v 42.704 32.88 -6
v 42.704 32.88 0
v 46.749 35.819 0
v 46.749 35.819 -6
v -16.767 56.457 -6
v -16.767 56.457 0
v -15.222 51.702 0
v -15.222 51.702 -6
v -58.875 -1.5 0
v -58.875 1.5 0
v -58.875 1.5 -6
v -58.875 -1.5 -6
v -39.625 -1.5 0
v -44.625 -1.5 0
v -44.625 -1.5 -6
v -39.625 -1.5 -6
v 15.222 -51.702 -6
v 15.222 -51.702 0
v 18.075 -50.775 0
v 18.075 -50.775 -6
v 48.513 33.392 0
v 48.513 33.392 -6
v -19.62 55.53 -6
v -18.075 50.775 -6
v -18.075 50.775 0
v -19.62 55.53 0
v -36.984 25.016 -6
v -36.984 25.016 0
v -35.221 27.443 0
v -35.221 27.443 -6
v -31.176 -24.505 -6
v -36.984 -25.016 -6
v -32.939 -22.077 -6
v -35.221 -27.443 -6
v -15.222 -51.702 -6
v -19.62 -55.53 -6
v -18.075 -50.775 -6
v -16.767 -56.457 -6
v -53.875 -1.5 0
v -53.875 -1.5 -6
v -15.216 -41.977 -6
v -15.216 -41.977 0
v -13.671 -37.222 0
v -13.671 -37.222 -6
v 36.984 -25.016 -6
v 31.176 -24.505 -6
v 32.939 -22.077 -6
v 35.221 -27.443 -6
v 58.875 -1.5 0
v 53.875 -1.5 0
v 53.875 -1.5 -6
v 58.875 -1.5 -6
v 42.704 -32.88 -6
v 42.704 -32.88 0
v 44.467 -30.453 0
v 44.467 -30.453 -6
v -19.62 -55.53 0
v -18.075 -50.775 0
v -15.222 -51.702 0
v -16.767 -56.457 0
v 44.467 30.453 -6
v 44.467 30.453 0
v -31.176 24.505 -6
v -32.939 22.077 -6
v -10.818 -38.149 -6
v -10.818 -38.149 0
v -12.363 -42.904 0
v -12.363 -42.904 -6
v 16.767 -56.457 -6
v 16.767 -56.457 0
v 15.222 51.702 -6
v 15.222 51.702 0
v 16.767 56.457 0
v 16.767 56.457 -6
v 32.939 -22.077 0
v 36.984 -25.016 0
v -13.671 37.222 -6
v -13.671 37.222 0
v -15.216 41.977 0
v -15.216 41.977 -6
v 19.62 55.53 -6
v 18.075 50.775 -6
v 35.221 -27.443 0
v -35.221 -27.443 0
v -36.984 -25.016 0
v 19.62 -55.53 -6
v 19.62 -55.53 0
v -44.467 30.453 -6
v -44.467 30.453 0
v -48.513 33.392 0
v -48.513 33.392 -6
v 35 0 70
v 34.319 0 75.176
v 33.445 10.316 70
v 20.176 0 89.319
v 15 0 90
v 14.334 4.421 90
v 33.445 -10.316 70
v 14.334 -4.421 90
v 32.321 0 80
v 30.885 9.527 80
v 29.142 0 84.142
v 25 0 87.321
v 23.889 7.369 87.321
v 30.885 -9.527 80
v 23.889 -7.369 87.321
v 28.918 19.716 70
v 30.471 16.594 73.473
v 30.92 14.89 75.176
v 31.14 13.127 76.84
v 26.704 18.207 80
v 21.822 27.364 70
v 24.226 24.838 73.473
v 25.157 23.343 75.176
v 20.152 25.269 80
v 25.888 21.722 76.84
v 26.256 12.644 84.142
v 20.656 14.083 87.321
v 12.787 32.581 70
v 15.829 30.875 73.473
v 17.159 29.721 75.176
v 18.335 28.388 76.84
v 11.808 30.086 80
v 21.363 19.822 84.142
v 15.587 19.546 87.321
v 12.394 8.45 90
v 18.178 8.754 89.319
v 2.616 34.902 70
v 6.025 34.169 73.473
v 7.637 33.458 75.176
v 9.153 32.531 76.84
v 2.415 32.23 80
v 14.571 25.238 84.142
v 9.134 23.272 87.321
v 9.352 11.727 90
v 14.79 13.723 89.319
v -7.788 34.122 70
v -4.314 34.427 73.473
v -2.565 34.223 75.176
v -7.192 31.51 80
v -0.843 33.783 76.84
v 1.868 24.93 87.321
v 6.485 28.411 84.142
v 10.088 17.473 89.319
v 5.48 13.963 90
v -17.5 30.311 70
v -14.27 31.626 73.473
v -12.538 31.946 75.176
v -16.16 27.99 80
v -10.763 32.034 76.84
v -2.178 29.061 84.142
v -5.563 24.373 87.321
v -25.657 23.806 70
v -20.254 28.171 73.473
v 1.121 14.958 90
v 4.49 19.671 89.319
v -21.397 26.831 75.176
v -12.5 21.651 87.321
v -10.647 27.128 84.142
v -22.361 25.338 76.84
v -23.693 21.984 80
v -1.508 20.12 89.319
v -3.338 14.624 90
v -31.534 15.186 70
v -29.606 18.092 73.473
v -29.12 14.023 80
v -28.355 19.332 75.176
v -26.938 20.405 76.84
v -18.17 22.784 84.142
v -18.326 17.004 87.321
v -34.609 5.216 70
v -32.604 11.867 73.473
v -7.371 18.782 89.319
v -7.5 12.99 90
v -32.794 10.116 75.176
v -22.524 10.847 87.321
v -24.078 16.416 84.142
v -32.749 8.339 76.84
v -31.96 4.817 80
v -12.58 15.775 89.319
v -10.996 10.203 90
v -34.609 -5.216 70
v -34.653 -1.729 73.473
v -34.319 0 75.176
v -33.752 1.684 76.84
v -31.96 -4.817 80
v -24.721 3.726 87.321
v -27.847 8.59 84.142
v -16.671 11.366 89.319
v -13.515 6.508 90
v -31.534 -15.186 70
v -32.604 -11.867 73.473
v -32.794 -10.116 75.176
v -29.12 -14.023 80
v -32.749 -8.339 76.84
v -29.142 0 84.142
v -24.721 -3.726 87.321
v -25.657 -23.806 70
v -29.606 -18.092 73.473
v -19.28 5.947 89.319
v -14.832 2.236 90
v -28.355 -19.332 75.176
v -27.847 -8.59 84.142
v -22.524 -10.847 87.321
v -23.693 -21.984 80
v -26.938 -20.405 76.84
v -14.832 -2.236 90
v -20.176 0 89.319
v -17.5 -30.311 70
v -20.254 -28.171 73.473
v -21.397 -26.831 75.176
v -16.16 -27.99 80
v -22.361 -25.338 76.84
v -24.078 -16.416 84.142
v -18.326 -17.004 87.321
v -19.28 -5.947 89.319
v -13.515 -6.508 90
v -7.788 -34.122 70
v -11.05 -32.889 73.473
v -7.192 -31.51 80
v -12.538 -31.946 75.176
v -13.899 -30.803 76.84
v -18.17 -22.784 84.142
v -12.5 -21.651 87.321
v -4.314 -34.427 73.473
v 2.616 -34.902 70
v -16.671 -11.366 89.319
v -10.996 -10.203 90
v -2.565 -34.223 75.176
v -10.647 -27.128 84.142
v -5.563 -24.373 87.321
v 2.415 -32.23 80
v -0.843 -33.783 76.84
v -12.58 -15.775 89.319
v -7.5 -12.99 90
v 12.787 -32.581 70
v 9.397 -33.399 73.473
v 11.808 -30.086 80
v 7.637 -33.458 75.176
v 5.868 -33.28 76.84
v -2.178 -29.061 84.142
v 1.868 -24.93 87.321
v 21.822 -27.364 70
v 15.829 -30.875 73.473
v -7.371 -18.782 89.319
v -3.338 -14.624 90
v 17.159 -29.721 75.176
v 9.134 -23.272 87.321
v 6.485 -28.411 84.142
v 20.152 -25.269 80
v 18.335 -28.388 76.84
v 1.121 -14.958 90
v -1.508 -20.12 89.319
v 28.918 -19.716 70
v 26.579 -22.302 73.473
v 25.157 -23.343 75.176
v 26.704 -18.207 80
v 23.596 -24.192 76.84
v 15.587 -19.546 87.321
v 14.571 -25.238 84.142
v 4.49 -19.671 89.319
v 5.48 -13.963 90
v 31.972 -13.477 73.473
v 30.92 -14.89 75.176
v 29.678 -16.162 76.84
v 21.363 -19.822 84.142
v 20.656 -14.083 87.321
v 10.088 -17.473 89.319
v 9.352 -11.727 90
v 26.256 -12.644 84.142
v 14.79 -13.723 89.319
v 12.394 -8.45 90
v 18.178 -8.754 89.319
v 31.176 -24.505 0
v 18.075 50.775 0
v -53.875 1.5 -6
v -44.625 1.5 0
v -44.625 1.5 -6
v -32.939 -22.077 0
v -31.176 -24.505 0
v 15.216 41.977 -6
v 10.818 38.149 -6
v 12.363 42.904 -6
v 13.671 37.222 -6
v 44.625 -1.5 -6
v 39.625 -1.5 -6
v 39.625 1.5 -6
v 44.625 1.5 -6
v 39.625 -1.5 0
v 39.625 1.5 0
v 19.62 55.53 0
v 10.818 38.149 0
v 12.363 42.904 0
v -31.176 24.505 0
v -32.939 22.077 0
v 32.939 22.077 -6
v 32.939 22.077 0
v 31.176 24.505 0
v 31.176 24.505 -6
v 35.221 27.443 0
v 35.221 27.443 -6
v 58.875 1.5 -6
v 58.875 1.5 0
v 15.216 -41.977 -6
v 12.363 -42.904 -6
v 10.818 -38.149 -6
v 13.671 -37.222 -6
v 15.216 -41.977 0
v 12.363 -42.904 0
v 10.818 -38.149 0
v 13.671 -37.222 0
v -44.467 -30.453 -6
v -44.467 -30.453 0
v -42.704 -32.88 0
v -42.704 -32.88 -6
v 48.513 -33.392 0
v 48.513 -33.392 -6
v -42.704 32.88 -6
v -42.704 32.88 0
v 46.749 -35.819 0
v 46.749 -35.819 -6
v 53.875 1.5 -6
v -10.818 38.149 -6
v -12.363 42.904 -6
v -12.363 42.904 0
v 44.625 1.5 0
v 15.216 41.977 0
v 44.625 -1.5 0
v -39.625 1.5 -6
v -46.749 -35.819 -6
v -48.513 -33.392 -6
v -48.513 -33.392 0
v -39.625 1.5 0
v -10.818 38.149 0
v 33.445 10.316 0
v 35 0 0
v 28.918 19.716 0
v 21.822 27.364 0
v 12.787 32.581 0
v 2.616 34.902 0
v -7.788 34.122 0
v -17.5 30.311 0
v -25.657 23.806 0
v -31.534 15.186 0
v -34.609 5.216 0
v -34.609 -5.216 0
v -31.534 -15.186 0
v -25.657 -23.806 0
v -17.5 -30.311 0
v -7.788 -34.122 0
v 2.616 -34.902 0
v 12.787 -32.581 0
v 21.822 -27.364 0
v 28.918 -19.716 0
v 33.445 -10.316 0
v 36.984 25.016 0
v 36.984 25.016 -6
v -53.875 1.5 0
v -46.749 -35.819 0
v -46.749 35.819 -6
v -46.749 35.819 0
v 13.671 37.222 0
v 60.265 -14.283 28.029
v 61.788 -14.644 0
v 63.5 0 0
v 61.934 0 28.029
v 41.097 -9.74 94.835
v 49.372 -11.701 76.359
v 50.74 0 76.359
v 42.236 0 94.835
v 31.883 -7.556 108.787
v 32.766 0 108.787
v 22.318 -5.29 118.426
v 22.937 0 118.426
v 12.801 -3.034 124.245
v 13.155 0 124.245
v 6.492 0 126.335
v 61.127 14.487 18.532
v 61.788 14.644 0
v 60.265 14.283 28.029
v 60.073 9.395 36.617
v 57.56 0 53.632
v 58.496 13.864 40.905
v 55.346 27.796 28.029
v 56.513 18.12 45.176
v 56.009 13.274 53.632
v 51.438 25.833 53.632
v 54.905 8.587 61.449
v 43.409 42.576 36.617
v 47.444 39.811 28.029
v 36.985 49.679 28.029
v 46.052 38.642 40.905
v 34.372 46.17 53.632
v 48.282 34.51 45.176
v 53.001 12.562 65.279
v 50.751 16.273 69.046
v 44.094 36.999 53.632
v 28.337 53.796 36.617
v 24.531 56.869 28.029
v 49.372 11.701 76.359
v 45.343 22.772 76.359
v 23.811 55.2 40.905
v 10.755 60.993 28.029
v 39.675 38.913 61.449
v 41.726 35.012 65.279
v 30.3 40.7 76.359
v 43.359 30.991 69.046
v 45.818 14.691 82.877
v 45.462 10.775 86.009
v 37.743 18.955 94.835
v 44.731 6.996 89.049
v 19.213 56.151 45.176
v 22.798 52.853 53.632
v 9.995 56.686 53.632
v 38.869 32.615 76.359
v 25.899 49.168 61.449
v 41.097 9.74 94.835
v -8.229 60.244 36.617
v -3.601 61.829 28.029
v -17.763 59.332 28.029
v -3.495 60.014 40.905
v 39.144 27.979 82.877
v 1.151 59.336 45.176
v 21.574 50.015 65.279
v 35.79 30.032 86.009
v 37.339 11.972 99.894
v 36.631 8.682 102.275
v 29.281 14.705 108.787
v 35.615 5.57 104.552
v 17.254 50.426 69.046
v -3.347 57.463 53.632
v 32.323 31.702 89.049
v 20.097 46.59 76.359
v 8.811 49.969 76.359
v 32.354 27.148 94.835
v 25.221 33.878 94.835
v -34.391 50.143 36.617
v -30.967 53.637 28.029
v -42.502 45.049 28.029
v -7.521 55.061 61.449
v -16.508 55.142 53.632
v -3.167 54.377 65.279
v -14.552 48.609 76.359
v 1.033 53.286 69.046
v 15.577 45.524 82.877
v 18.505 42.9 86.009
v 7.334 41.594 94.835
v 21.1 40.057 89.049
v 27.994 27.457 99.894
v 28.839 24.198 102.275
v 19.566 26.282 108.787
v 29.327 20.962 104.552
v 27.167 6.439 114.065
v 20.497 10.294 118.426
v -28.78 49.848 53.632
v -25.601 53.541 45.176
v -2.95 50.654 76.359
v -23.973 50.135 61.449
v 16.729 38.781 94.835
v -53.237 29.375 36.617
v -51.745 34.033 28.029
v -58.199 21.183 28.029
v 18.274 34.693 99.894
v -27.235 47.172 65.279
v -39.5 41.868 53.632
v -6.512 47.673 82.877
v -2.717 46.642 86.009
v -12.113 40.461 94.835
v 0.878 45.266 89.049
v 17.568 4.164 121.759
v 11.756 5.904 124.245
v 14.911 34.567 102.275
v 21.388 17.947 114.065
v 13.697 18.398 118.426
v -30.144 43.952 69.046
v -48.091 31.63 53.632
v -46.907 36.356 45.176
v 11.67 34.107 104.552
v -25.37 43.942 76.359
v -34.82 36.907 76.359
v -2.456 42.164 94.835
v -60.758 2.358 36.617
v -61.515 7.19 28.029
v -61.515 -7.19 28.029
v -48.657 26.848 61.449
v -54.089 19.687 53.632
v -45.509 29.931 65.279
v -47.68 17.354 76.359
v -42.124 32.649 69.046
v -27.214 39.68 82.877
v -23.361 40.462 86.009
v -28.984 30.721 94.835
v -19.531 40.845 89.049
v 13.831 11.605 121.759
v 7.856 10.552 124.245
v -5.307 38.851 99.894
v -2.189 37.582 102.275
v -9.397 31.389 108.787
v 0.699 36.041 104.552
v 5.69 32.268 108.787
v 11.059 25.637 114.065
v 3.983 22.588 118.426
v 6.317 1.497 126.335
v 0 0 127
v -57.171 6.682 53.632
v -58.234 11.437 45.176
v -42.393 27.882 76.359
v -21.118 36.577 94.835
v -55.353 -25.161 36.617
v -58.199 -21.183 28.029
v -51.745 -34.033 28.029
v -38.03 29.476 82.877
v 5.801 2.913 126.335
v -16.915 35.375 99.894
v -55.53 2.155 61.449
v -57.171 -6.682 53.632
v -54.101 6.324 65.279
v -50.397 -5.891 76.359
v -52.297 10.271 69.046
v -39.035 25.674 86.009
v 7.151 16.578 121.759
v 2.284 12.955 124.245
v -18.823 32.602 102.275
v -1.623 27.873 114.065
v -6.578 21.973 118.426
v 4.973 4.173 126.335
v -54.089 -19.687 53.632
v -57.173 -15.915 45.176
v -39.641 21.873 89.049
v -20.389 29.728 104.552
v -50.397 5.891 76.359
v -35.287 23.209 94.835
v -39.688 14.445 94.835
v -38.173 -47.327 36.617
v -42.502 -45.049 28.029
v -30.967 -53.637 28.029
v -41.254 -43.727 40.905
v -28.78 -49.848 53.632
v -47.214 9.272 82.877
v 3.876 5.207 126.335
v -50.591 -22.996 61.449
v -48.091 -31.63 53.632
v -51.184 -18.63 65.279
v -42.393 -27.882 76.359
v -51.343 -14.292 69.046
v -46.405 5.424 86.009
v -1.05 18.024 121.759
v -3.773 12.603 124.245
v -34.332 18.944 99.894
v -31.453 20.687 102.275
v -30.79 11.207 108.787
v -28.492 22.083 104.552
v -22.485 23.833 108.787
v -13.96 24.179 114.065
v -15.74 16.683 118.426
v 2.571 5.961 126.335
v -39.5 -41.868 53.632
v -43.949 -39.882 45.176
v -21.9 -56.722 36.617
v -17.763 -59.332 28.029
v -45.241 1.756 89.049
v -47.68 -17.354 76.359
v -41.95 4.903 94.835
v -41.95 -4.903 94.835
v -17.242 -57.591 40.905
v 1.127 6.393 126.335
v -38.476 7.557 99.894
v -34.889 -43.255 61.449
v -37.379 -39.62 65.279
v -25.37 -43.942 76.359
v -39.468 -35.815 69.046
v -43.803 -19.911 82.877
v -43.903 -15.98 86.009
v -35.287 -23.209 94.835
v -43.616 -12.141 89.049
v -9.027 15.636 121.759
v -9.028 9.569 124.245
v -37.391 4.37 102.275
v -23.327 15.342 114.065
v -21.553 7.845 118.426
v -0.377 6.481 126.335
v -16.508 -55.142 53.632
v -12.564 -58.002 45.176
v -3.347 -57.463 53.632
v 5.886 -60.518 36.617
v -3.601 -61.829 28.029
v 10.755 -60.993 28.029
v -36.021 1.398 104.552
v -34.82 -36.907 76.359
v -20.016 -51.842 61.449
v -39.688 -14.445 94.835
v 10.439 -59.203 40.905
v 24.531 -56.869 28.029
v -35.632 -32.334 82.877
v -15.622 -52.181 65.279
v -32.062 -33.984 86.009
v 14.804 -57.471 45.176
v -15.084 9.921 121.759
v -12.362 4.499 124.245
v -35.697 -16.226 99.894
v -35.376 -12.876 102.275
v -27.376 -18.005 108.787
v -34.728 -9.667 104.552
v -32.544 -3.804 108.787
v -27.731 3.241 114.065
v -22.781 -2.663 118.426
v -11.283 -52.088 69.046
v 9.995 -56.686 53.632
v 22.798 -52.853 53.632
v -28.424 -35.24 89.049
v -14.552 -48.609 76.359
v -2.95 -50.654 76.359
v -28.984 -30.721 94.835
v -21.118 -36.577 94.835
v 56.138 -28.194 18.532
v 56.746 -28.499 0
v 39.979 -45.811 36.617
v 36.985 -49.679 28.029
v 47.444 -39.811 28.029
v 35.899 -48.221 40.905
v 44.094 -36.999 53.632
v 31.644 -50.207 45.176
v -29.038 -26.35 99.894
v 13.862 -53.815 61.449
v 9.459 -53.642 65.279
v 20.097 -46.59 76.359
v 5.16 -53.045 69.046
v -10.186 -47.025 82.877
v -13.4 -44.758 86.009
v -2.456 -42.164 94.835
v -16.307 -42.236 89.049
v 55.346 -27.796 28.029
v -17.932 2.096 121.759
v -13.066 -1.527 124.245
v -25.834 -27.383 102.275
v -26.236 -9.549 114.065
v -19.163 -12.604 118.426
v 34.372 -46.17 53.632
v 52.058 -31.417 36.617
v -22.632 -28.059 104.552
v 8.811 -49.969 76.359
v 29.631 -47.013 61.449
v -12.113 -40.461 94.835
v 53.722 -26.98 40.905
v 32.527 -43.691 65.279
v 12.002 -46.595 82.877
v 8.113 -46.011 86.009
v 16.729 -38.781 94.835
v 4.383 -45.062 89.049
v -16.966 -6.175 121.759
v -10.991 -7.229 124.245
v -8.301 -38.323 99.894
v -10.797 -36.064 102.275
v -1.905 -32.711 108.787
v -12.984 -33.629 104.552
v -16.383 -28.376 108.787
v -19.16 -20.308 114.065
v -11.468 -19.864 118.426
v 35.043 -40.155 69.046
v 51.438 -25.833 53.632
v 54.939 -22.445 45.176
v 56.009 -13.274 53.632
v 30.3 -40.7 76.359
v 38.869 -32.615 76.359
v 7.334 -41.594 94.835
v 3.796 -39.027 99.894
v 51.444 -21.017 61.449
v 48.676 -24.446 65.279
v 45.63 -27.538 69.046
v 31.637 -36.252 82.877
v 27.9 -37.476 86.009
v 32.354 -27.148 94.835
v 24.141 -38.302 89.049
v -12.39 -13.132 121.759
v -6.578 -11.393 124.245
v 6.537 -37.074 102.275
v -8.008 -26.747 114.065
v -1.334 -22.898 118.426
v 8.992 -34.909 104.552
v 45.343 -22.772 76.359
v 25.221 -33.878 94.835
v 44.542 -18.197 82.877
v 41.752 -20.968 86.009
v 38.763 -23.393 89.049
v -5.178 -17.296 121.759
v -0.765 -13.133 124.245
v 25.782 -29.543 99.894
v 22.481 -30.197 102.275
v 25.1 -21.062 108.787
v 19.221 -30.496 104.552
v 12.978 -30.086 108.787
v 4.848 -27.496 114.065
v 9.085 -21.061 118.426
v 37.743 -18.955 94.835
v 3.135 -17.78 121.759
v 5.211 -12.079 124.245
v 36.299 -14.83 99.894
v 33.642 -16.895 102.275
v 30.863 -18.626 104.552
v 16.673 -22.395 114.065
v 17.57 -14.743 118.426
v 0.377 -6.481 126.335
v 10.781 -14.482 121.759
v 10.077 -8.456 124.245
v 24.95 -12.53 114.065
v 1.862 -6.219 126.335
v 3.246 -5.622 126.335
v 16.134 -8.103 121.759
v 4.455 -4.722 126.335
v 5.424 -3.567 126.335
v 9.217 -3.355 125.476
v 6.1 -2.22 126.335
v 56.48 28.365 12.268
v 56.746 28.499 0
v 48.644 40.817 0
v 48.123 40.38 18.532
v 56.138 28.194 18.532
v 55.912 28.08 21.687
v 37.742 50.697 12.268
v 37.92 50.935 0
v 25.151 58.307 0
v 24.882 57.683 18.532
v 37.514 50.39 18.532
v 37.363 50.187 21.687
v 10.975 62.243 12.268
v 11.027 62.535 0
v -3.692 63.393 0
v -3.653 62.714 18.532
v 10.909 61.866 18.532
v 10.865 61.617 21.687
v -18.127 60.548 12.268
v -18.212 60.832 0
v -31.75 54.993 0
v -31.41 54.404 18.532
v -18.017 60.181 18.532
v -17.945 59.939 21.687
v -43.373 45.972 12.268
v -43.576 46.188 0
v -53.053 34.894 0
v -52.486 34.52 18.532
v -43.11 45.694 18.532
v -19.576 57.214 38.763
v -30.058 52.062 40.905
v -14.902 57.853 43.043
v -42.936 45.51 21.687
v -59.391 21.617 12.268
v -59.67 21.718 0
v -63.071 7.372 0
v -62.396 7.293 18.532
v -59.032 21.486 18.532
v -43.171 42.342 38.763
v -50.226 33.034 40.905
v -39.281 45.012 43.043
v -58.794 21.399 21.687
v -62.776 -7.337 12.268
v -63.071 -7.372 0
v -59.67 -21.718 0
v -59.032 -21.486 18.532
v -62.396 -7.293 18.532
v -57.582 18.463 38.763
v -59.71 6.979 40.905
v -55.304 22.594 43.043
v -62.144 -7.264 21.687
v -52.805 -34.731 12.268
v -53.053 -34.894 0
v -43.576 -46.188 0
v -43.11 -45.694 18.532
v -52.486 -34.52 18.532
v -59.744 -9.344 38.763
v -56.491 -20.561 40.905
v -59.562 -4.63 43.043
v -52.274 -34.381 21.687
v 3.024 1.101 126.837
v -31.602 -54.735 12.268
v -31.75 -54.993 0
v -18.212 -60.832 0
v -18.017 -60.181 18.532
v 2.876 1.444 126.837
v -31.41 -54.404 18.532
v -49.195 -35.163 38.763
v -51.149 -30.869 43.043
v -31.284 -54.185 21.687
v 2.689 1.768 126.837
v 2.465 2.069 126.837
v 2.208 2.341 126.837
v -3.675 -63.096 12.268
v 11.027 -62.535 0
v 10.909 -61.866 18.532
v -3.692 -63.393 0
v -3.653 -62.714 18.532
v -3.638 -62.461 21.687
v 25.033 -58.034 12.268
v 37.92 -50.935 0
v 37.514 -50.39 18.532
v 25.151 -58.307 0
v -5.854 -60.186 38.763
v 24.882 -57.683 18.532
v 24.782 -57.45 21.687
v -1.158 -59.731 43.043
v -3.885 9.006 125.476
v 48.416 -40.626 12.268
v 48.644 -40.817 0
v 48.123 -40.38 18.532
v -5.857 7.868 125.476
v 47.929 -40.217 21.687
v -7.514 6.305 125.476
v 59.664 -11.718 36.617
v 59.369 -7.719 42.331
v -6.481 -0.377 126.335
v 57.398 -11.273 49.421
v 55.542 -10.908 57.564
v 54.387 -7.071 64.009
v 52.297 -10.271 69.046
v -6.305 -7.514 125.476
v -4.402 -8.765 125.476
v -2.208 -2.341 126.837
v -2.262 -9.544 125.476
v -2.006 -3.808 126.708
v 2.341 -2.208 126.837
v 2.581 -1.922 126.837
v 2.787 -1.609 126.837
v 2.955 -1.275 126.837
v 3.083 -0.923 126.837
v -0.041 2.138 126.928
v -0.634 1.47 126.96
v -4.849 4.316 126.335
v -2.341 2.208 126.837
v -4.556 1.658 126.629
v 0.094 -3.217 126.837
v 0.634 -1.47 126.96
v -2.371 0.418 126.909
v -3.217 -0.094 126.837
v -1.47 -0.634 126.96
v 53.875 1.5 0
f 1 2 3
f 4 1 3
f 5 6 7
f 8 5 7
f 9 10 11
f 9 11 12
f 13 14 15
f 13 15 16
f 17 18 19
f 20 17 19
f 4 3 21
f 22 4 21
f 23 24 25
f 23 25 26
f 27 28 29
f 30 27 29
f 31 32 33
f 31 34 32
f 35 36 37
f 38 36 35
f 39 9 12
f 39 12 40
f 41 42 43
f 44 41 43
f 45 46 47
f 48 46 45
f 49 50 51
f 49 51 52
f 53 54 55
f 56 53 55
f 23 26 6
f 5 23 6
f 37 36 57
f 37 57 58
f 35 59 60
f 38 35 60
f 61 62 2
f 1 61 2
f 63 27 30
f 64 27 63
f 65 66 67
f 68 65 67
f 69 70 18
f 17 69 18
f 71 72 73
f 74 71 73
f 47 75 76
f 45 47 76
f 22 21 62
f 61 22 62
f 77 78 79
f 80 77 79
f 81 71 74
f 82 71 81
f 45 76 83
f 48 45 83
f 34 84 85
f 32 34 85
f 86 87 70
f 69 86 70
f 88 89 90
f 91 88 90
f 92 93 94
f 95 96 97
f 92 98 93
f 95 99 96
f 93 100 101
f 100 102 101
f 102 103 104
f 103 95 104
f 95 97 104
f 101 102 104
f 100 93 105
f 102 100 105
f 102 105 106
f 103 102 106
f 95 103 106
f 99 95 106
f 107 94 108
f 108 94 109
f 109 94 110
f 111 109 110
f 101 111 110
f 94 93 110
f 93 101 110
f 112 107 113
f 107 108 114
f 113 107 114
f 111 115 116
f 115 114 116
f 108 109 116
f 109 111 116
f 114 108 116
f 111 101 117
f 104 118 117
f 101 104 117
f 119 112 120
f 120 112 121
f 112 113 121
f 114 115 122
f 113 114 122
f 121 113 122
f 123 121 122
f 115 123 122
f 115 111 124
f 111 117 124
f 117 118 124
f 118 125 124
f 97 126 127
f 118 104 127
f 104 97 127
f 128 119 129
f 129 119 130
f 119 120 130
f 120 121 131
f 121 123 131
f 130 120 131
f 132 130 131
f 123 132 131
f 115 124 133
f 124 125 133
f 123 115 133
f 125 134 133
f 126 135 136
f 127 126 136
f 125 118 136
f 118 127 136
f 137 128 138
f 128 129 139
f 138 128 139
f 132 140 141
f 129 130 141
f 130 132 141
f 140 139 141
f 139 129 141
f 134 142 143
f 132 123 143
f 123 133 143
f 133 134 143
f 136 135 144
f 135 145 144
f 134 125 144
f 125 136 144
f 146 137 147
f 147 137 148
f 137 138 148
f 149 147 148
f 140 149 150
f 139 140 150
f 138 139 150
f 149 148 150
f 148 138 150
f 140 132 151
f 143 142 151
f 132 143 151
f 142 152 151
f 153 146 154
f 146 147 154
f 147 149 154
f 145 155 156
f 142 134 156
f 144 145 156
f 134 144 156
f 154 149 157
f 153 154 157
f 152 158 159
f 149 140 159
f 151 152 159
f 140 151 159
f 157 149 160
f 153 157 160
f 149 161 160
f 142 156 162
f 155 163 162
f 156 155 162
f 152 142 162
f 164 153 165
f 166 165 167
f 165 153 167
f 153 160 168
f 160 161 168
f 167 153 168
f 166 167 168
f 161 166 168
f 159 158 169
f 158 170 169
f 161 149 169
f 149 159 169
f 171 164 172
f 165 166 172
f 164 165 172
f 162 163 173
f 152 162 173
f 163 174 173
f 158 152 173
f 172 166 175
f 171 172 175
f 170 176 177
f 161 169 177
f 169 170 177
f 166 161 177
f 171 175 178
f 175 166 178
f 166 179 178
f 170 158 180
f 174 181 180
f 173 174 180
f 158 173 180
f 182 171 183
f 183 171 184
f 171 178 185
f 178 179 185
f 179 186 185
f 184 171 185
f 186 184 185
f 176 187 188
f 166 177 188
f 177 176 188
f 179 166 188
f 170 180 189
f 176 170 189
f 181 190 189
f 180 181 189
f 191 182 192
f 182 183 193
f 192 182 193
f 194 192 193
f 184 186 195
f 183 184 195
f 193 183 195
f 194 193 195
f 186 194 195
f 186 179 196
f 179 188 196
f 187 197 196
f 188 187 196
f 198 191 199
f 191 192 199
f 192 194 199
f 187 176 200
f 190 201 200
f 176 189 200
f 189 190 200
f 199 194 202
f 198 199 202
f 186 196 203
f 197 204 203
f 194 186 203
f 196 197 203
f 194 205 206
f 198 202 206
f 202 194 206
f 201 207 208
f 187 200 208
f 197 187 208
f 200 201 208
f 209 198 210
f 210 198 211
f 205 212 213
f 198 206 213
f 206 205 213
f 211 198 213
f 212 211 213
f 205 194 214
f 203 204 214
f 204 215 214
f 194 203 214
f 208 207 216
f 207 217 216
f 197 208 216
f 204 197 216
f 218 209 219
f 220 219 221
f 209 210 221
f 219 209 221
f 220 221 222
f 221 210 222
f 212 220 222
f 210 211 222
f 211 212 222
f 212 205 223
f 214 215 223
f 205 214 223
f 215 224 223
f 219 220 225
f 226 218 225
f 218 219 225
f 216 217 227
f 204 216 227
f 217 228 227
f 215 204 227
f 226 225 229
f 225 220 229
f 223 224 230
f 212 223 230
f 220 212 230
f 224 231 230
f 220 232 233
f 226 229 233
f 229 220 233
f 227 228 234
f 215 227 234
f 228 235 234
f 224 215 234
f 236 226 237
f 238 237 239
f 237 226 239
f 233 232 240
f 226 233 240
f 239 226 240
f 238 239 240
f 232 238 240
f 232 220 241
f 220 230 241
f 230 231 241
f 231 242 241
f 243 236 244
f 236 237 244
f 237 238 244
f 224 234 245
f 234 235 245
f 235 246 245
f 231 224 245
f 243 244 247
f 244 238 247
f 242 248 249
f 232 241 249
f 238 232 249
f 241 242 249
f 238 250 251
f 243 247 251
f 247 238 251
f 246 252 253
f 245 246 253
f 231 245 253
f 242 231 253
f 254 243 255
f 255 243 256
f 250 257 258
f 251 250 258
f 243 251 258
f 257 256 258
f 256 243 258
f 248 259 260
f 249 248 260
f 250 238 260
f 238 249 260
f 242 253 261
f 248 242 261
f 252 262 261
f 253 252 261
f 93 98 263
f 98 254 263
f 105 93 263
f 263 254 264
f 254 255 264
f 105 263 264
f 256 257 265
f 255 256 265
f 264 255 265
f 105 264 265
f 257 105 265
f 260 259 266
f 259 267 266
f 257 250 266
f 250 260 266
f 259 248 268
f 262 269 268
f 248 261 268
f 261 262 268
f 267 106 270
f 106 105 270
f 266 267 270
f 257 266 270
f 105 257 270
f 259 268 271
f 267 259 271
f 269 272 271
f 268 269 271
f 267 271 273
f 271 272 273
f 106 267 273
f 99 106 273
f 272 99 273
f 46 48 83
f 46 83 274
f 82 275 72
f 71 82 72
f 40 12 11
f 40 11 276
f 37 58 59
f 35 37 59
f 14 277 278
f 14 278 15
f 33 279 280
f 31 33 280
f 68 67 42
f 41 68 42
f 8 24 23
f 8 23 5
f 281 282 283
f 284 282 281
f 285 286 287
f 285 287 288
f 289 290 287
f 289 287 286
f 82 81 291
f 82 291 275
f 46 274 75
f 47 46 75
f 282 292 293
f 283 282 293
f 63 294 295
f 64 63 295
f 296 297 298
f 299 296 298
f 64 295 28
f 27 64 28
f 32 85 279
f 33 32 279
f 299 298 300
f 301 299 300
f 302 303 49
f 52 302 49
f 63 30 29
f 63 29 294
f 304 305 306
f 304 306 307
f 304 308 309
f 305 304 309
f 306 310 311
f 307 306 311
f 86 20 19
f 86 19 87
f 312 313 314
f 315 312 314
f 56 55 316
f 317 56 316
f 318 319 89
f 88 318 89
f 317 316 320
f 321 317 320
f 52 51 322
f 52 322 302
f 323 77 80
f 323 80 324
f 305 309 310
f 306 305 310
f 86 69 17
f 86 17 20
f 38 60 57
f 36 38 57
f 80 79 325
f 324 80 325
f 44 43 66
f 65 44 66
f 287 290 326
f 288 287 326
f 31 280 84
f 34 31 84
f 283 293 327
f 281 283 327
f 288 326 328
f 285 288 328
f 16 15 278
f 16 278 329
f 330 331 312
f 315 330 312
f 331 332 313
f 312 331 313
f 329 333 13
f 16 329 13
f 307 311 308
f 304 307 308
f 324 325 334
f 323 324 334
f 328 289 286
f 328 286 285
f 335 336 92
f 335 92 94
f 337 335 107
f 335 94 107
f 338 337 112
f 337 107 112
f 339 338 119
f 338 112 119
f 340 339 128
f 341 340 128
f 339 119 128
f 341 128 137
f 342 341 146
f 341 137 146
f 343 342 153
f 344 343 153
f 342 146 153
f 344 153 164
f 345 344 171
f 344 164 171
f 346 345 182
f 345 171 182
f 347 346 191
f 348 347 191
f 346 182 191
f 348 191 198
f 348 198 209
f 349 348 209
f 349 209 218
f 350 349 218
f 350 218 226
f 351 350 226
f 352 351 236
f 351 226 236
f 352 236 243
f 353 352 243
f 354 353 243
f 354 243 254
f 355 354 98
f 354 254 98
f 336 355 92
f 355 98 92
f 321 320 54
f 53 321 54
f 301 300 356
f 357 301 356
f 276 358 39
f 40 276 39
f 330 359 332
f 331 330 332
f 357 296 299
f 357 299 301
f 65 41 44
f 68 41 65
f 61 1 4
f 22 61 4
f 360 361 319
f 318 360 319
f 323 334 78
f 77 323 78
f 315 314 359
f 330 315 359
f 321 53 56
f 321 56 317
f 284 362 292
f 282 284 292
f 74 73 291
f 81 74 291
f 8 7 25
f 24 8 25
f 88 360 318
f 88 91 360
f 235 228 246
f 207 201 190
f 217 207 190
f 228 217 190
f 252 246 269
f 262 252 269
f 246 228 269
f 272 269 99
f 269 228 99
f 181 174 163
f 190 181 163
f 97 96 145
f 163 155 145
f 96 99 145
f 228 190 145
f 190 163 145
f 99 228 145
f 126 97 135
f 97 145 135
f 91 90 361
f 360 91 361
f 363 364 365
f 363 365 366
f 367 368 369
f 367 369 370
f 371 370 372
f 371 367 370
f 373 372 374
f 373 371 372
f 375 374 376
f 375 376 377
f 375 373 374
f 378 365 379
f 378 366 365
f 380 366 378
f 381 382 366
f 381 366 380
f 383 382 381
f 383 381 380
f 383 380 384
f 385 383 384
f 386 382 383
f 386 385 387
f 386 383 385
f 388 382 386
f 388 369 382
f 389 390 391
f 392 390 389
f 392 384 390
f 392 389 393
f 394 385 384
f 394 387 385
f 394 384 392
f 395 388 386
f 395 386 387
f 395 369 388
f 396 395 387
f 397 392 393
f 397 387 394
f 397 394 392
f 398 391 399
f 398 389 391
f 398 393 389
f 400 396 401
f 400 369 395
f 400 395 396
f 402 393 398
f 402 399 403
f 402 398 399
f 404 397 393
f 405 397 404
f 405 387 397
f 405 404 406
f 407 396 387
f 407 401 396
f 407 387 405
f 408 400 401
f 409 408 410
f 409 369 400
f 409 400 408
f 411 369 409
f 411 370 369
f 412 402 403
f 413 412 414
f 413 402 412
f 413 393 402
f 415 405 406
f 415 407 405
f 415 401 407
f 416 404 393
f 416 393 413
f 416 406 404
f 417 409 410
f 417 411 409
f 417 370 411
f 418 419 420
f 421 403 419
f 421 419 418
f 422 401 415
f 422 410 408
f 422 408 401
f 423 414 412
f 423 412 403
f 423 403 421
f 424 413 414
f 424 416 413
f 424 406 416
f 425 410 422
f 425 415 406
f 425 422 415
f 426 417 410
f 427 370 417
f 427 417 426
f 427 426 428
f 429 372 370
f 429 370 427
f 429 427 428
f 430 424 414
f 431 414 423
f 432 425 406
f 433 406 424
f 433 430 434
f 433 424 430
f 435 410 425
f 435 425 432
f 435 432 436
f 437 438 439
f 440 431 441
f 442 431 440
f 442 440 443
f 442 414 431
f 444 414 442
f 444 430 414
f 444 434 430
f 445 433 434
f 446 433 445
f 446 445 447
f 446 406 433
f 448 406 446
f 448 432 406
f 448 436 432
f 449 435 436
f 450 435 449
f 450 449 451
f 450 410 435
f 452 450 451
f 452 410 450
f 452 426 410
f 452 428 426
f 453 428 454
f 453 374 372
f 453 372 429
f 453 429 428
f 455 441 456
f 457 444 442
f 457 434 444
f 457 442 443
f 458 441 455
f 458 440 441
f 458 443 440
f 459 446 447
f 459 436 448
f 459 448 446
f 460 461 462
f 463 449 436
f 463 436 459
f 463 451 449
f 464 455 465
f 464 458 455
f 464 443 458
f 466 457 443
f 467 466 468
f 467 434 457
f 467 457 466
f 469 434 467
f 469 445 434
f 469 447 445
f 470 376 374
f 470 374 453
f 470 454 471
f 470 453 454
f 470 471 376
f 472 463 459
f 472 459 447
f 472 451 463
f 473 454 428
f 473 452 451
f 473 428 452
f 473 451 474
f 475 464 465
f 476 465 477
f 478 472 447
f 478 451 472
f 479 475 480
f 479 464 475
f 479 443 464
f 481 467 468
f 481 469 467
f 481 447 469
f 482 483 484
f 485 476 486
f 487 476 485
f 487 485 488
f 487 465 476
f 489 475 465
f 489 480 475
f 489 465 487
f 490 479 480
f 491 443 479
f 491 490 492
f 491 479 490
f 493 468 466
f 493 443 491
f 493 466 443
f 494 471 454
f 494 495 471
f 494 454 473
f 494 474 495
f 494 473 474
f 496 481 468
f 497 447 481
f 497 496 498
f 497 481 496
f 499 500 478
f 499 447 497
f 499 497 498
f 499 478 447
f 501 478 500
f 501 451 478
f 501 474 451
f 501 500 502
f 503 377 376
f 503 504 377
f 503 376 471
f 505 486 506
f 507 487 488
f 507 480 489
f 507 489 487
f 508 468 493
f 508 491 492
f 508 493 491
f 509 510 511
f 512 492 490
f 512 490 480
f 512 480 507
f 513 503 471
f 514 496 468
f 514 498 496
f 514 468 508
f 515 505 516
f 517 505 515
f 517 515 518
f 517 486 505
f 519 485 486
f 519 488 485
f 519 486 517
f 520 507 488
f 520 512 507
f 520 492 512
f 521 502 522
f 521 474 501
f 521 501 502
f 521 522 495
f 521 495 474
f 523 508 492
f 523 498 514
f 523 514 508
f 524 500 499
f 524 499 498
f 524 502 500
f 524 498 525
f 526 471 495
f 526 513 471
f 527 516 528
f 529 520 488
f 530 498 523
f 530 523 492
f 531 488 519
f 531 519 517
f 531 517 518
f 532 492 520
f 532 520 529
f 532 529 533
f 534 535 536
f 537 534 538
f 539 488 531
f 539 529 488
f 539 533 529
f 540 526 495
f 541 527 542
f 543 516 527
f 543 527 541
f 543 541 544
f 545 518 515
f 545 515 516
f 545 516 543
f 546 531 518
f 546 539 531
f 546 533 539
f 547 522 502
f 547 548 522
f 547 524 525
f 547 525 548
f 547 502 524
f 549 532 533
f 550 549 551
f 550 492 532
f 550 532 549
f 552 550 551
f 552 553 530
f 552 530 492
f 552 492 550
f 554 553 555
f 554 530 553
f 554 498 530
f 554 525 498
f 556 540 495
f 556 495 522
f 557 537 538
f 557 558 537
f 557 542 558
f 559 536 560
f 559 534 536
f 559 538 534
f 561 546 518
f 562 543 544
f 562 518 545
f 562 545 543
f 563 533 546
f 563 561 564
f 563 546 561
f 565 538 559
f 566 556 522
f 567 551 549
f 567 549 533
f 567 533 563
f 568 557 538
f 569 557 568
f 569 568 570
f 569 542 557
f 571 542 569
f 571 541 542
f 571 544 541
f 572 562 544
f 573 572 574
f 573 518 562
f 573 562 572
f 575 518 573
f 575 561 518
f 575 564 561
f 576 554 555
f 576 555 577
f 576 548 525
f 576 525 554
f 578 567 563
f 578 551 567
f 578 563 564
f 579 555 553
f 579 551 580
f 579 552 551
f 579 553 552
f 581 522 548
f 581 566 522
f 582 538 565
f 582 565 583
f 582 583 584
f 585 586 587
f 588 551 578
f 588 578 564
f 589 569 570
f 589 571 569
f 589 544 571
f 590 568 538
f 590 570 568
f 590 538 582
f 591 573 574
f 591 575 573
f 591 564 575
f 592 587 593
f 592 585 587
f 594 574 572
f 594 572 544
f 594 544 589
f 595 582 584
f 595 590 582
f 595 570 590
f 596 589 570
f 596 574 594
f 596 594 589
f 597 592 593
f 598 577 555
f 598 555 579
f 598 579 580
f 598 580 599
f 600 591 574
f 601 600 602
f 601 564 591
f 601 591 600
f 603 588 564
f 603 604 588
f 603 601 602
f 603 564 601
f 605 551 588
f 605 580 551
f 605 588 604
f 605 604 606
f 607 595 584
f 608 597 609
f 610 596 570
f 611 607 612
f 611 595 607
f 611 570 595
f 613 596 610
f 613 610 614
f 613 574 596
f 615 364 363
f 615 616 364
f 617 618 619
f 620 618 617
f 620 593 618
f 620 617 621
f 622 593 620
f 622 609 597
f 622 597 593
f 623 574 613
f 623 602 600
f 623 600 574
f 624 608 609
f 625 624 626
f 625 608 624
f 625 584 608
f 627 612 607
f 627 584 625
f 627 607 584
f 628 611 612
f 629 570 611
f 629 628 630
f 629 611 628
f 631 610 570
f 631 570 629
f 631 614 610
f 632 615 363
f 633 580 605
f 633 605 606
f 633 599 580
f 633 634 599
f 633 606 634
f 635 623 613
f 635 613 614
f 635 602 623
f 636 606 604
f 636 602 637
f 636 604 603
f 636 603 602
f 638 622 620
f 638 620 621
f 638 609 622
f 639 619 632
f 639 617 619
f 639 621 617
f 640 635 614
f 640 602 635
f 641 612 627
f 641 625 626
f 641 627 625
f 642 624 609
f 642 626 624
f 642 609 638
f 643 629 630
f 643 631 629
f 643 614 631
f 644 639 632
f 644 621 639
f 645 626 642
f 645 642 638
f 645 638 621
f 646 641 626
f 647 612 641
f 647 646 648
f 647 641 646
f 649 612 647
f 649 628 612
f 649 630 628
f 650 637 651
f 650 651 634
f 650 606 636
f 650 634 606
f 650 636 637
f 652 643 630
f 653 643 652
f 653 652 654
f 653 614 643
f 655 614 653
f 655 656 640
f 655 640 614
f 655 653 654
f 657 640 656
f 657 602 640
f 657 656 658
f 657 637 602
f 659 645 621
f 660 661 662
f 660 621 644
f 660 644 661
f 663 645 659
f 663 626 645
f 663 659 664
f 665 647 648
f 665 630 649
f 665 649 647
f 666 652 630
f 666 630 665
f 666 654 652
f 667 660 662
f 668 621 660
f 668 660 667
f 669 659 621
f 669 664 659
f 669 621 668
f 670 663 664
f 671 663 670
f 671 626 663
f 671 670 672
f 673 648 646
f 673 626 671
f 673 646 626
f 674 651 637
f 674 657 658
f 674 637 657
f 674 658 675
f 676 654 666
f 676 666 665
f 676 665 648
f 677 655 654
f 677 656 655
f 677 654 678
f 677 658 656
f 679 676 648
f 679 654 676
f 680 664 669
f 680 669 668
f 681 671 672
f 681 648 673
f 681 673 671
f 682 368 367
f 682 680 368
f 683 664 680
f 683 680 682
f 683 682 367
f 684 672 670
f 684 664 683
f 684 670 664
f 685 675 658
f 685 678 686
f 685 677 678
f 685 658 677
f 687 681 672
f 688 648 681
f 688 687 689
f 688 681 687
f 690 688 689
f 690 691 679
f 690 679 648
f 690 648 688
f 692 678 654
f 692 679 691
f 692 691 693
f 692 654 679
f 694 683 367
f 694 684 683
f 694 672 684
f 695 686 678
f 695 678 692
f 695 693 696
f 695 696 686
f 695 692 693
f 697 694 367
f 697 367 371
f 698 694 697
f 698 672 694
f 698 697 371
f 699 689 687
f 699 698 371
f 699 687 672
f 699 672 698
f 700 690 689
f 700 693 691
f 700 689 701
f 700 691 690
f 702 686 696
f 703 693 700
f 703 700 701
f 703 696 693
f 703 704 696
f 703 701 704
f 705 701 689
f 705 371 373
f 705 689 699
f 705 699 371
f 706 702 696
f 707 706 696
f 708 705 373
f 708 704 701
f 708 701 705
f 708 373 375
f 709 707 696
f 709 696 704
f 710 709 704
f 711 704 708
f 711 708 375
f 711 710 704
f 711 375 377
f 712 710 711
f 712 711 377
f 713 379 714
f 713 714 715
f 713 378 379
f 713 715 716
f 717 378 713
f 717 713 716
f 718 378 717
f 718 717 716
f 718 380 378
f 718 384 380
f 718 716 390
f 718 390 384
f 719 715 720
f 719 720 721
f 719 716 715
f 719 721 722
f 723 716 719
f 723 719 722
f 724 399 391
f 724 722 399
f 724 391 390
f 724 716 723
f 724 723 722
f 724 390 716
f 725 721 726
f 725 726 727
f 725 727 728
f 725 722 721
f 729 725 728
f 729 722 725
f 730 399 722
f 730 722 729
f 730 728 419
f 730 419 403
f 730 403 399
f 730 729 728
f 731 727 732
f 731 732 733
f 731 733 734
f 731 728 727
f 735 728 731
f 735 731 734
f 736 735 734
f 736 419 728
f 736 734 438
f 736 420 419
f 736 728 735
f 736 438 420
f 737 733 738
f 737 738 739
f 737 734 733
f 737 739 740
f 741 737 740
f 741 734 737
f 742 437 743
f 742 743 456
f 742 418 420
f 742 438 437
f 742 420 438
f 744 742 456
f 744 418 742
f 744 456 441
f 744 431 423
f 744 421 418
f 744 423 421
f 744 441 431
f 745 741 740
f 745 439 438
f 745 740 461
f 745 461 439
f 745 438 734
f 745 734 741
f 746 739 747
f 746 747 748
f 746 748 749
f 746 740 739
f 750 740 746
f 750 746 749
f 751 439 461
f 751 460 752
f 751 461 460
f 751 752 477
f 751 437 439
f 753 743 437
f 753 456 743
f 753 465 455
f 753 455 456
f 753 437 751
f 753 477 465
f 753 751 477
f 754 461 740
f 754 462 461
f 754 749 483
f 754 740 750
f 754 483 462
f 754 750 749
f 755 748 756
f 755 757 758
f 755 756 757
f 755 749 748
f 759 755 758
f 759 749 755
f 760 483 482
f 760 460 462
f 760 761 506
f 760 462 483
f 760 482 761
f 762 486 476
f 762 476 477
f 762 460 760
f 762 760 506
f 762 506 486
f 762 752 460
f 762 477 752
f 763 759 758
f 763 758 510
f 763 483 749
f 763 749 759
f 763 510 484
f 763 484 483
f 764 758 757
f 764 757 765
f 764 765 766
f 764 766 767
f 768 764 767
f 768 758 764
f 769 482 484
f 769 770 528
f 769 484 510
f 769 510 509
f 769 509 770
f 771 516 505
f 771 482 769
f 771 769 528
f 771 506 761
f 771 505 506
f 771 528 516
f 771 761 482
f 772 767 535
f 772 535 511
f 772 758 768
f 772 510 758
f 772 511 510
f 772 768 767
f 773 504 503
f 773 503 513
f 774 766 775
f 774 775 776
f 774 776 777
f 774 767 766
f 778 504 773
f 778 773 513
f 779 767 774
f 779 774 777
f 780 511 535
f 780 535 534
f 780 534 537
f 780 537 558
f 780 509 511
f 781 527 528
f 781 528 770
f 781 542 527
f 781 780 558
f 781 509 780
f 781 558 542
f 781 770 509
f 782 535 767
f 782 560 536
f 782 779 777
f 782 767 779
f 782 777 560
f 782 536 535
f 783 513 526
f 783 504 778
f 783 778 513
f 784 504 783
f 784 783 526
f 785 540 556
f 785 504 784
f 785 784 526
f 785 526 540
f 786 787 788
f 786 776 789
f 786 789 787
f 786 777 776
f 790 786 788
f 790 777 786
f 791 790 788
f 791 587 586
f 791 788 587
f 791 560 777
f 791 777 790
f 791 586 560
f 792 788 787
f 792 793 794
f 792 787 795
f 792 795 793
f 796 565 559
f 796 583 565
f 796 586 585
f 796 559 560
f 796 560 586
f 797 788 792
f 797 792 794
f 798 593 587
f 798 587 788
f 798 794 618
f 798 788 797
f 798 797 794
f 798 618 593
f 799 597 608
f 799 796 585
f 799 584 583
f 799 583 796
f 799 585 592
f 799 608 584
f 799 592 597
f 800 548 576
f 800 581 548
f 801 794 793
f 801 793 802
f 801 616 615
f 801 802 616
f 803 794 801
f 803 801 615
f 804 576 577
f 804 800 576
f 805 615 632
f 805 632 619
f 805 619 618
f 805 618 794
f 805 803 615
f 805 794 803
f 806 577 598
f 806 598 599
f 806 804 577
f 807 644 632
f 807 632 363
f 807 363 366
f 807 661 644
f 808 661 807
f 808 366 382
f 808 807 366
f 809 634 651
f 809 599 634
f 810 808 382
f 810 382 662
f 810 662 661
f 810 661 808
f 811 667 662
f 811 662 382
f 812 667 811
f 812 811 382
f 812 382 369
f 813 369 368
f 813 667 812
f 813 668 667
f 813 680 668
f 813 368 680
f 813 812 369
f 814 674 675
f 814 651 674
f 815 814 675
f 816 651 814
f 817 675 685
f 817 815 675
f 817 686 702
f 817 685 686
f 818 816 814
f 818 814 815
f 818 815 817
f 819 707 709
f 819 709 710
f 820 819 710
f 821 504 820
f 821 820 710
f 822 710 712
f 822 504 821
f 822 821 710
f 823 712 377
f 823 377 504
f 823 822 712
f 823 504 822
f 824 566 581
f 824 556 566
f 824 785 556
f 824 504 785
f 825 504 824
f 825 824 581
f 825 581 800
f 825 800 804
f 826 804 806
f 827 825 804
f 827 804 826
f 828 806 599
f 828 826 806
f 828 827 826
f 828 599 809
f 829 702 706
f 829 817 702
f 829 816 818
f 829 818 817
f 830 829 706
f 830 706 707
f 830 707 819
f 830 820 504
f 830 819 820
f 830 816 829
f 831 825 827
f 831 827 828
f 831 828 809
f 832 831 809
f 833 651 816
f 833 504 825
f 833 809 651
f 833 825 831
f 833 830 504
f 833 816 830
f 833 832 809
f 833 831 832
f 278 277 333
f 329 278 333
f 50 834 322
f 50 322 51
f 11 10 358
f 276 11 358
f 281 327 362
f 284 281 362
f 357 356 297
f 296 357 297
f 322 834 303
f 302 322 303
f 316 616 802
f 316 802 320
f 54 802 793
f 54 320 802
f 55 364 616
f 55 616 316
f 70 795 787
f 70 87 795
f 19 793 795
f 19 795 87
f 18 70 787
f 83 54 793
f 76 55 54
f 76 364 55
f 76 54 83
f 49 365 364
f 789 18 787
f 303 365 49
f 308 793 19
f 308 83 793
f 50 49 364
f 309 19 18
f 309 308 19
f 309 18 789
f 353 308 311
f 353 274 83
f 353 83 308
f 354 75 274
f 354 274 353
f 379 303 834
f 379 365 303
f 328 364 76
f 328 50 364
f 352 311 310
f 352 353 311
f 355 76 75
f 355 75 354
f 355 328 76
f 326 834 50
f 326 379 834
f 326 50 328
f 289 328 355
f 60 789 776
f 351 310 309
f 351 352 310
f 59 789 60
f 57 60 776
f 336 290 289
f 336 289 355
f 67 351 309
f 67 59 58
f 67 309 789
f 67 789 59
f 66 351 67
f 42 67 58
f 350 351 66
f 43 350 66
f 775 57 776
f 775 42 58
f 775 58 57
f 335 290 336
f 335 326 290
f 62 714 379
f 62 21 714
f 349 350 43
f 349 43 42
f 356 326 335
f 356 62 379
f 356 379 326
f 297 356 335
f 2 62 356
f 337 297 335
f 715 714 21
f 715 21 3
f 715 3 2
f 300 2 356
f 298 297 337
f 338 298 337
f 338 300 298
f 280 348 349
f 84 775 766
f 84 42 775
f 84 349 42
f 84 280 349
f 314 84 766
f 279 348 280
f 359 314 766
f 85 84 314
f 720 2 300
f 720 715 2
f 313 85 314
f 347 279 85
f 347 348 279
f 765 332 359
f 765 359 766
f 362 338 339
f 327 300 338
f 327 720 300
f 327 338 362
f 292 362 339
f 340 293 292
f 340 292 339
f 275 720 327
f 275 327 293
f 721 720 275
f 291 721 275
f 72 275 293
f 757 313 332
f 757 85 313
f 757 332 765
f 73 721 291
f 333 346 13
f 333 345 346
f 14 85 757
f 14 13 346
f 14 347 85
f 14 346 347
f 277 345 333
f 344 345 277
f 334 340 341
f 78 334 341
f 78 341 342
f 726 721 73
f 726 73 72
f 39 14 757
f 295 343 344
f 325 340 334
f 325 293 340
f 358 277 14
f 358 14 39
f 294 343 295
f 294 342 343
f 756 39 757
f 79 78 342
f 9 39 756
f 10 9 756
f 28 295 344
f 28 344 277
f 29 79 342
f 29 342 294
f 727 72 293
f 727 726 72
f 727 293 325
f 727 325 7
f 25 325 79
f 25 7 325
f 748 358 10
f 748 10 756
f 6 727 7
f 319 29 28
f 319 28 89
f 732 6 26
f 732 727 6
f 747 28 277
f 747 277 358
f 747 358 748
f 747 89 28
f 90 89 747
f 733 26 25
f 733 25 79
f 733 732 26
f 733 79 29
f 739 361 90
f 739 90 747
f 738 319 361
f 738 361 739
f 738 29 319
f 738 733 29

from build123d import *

# Parameters (mm, degrees)
F4_W     = 5
F4_H     = 3
F5_DEPTH = 6


with BuildPart() as f1:
    # F0 (on Front) → F1 (revolve)
    with BuildSketch(Plane.XZ):
        with BuildLine():
            Line((0, 0), (63.5, 0))
            add(Edge.make_bspline(
                [(63.5, 0), (63.5, 127), (0, 127)],
                knots=[4.7123889804, 4.7123889804, 4.7123889804, 6.2831853072, 6.2831853072, 6.2831853072], degree=2, weights=[1, 0.7071067812, 1]))
            Line((0, 127), (0, 0))
        make_face()
    revolve(axis=Axis((0, 0, 63.5), (0, 0, 1)))

    # F2 (on Front) → F3 (revolve, cut)
    with BuildSketch(Plane.XZ):
        with BuildLine():
            ThreePointArc((35, 70), (29.1421356237, 84.1421356237), (15, 90))
            Line((15, 90), (0, 90))
            Line((0, 90), (0, 0))
            Line((0, 0), (35, 0))
            Line((35, 0), (35, 70))
        make_face()
    revolve(axis=Axis((0, 0, 45), (0, 0, 1)), mode=Mode.SUBTRACT)

    # F4 (on face) → F5 (join)
    with BuildSketch(Plane(origin=(0, 0, 0), x_dir=(1, 0, 0), z_dir=(0, 0, -1))):
        with Locations((-56.375, 0)):
            Rectangle(F4_W, F4_H)
        with Locations((-42.125, 0)):
            Rectangle(F4_W, F4_H)
        Polygon((-46.7491976654, -35.8193822203), (-42.7041126935, -32.8804559588), (-44.4674684504, -30.4534049757), (-48.5125534223, -33.3923312372), align=None)
        Polygon((-35.2207054955, -27.4434423751), (-31.1756205237, -24.5045161137), (-32.9389762805, -22.0774651305), (-36.9840612524, -25.016391392), align=None)
        Polygon((-16.7667907694, -56.4569778884), (-15.2217057975, -51.701695307), (-18.0748753464, -50.7746443238), (-19.6199603183, -55.5299269053), align=None)
        Polygon((-12.3632985995, -42.9044225312), (-10.8182136277, -38.1491399498), (-13.6713831766, -37.2220889666), (-15.2164681484, -41.9773715481), align=None)
        Polygon((19.6199603183, -55.5299269053), (18.0748753464, -50.7746443238), (15.2217057975, -51.701695307), (16.7667907694, -56.4569778884), align=None)
        Polygon((15.2164681484, -41.9773715481), (13.6713831766, -37.2220889666), (10.8182136277, -38.1491399498), (12.3632985995, -42.9044225312), align=None)
        Polygon((48.5125534223, -33.3923312372), (44.4674684504, -30.4534049757), (42.7041126935, -32.8804559588), (46.7491976654, -35.8193822203), align=None)
        Polygon((36.9840612524, -25.016391392), (32.9389762805, -22.0774651305), (31.1756205237, -24.5045161137), (35.2207054955, -27.4434423751), align=None)
        with Locations((56.375, 0)):
            Rectangle(F4_W, F4_H)
        with Locations((42.125, 0)):
            Rectangle(F4_W, F4_H)
        Polygon((46.7491976654, 35.8193822203), (42.7041126935, 32.8804559588), (44.4674684504, 30.4534049757), (48.5125534223, 33.3923312372), align=None)
        Polygon((35.2207054955, 27.4434423751), (31.1756205237, 24.5045161137), (32.9389762805, 22.0774651305), (36.9840612524, 25.016391392), align=None)
        Polygon((16.7667907694, 56.4569778884), (15.2217057975, 51.701695307), (18.0748753464, 50.7746443238), (19.6199603183, 55.5299269053), align=None)
        Polygon((12.3632985995, 42.9044225312), (10.8182136277, 38.1491399498), (13.6713831766, 37.2220889666), (15.2164681484, 41.9773715481), align=None)
        Polygon((-19.6199603183, 55.5299269053), (-18.0748753464, 50.7746443238), (-15.2217057975, 51.701695307), (-16.7667907694, 56.4569778884), align=None)
        Polygon((-15.2164681484, 41.9773715481), (-13.6713831766, 37.2220889666), (-10.8182136277, 38.1491399498), (-12.3632985995, 42.9044225312), align=None)
        Polygon((-48.5125534223, 33.3923312372), (-44.4674684504, 30.4534049757), (-42.7041126935, 32.8804559588), (-46.7491976654, 35.8193822203), align=None)
        Polygon((-36.9840612524, 25.016391392), (-32.9389762805, 22.0774651305), (-31.1756205237, 24.5045161137), (-35.2207054955, 27.4434423751), align=None)
    extrude(amount=F5_DEPTH)


solid = f1.part
